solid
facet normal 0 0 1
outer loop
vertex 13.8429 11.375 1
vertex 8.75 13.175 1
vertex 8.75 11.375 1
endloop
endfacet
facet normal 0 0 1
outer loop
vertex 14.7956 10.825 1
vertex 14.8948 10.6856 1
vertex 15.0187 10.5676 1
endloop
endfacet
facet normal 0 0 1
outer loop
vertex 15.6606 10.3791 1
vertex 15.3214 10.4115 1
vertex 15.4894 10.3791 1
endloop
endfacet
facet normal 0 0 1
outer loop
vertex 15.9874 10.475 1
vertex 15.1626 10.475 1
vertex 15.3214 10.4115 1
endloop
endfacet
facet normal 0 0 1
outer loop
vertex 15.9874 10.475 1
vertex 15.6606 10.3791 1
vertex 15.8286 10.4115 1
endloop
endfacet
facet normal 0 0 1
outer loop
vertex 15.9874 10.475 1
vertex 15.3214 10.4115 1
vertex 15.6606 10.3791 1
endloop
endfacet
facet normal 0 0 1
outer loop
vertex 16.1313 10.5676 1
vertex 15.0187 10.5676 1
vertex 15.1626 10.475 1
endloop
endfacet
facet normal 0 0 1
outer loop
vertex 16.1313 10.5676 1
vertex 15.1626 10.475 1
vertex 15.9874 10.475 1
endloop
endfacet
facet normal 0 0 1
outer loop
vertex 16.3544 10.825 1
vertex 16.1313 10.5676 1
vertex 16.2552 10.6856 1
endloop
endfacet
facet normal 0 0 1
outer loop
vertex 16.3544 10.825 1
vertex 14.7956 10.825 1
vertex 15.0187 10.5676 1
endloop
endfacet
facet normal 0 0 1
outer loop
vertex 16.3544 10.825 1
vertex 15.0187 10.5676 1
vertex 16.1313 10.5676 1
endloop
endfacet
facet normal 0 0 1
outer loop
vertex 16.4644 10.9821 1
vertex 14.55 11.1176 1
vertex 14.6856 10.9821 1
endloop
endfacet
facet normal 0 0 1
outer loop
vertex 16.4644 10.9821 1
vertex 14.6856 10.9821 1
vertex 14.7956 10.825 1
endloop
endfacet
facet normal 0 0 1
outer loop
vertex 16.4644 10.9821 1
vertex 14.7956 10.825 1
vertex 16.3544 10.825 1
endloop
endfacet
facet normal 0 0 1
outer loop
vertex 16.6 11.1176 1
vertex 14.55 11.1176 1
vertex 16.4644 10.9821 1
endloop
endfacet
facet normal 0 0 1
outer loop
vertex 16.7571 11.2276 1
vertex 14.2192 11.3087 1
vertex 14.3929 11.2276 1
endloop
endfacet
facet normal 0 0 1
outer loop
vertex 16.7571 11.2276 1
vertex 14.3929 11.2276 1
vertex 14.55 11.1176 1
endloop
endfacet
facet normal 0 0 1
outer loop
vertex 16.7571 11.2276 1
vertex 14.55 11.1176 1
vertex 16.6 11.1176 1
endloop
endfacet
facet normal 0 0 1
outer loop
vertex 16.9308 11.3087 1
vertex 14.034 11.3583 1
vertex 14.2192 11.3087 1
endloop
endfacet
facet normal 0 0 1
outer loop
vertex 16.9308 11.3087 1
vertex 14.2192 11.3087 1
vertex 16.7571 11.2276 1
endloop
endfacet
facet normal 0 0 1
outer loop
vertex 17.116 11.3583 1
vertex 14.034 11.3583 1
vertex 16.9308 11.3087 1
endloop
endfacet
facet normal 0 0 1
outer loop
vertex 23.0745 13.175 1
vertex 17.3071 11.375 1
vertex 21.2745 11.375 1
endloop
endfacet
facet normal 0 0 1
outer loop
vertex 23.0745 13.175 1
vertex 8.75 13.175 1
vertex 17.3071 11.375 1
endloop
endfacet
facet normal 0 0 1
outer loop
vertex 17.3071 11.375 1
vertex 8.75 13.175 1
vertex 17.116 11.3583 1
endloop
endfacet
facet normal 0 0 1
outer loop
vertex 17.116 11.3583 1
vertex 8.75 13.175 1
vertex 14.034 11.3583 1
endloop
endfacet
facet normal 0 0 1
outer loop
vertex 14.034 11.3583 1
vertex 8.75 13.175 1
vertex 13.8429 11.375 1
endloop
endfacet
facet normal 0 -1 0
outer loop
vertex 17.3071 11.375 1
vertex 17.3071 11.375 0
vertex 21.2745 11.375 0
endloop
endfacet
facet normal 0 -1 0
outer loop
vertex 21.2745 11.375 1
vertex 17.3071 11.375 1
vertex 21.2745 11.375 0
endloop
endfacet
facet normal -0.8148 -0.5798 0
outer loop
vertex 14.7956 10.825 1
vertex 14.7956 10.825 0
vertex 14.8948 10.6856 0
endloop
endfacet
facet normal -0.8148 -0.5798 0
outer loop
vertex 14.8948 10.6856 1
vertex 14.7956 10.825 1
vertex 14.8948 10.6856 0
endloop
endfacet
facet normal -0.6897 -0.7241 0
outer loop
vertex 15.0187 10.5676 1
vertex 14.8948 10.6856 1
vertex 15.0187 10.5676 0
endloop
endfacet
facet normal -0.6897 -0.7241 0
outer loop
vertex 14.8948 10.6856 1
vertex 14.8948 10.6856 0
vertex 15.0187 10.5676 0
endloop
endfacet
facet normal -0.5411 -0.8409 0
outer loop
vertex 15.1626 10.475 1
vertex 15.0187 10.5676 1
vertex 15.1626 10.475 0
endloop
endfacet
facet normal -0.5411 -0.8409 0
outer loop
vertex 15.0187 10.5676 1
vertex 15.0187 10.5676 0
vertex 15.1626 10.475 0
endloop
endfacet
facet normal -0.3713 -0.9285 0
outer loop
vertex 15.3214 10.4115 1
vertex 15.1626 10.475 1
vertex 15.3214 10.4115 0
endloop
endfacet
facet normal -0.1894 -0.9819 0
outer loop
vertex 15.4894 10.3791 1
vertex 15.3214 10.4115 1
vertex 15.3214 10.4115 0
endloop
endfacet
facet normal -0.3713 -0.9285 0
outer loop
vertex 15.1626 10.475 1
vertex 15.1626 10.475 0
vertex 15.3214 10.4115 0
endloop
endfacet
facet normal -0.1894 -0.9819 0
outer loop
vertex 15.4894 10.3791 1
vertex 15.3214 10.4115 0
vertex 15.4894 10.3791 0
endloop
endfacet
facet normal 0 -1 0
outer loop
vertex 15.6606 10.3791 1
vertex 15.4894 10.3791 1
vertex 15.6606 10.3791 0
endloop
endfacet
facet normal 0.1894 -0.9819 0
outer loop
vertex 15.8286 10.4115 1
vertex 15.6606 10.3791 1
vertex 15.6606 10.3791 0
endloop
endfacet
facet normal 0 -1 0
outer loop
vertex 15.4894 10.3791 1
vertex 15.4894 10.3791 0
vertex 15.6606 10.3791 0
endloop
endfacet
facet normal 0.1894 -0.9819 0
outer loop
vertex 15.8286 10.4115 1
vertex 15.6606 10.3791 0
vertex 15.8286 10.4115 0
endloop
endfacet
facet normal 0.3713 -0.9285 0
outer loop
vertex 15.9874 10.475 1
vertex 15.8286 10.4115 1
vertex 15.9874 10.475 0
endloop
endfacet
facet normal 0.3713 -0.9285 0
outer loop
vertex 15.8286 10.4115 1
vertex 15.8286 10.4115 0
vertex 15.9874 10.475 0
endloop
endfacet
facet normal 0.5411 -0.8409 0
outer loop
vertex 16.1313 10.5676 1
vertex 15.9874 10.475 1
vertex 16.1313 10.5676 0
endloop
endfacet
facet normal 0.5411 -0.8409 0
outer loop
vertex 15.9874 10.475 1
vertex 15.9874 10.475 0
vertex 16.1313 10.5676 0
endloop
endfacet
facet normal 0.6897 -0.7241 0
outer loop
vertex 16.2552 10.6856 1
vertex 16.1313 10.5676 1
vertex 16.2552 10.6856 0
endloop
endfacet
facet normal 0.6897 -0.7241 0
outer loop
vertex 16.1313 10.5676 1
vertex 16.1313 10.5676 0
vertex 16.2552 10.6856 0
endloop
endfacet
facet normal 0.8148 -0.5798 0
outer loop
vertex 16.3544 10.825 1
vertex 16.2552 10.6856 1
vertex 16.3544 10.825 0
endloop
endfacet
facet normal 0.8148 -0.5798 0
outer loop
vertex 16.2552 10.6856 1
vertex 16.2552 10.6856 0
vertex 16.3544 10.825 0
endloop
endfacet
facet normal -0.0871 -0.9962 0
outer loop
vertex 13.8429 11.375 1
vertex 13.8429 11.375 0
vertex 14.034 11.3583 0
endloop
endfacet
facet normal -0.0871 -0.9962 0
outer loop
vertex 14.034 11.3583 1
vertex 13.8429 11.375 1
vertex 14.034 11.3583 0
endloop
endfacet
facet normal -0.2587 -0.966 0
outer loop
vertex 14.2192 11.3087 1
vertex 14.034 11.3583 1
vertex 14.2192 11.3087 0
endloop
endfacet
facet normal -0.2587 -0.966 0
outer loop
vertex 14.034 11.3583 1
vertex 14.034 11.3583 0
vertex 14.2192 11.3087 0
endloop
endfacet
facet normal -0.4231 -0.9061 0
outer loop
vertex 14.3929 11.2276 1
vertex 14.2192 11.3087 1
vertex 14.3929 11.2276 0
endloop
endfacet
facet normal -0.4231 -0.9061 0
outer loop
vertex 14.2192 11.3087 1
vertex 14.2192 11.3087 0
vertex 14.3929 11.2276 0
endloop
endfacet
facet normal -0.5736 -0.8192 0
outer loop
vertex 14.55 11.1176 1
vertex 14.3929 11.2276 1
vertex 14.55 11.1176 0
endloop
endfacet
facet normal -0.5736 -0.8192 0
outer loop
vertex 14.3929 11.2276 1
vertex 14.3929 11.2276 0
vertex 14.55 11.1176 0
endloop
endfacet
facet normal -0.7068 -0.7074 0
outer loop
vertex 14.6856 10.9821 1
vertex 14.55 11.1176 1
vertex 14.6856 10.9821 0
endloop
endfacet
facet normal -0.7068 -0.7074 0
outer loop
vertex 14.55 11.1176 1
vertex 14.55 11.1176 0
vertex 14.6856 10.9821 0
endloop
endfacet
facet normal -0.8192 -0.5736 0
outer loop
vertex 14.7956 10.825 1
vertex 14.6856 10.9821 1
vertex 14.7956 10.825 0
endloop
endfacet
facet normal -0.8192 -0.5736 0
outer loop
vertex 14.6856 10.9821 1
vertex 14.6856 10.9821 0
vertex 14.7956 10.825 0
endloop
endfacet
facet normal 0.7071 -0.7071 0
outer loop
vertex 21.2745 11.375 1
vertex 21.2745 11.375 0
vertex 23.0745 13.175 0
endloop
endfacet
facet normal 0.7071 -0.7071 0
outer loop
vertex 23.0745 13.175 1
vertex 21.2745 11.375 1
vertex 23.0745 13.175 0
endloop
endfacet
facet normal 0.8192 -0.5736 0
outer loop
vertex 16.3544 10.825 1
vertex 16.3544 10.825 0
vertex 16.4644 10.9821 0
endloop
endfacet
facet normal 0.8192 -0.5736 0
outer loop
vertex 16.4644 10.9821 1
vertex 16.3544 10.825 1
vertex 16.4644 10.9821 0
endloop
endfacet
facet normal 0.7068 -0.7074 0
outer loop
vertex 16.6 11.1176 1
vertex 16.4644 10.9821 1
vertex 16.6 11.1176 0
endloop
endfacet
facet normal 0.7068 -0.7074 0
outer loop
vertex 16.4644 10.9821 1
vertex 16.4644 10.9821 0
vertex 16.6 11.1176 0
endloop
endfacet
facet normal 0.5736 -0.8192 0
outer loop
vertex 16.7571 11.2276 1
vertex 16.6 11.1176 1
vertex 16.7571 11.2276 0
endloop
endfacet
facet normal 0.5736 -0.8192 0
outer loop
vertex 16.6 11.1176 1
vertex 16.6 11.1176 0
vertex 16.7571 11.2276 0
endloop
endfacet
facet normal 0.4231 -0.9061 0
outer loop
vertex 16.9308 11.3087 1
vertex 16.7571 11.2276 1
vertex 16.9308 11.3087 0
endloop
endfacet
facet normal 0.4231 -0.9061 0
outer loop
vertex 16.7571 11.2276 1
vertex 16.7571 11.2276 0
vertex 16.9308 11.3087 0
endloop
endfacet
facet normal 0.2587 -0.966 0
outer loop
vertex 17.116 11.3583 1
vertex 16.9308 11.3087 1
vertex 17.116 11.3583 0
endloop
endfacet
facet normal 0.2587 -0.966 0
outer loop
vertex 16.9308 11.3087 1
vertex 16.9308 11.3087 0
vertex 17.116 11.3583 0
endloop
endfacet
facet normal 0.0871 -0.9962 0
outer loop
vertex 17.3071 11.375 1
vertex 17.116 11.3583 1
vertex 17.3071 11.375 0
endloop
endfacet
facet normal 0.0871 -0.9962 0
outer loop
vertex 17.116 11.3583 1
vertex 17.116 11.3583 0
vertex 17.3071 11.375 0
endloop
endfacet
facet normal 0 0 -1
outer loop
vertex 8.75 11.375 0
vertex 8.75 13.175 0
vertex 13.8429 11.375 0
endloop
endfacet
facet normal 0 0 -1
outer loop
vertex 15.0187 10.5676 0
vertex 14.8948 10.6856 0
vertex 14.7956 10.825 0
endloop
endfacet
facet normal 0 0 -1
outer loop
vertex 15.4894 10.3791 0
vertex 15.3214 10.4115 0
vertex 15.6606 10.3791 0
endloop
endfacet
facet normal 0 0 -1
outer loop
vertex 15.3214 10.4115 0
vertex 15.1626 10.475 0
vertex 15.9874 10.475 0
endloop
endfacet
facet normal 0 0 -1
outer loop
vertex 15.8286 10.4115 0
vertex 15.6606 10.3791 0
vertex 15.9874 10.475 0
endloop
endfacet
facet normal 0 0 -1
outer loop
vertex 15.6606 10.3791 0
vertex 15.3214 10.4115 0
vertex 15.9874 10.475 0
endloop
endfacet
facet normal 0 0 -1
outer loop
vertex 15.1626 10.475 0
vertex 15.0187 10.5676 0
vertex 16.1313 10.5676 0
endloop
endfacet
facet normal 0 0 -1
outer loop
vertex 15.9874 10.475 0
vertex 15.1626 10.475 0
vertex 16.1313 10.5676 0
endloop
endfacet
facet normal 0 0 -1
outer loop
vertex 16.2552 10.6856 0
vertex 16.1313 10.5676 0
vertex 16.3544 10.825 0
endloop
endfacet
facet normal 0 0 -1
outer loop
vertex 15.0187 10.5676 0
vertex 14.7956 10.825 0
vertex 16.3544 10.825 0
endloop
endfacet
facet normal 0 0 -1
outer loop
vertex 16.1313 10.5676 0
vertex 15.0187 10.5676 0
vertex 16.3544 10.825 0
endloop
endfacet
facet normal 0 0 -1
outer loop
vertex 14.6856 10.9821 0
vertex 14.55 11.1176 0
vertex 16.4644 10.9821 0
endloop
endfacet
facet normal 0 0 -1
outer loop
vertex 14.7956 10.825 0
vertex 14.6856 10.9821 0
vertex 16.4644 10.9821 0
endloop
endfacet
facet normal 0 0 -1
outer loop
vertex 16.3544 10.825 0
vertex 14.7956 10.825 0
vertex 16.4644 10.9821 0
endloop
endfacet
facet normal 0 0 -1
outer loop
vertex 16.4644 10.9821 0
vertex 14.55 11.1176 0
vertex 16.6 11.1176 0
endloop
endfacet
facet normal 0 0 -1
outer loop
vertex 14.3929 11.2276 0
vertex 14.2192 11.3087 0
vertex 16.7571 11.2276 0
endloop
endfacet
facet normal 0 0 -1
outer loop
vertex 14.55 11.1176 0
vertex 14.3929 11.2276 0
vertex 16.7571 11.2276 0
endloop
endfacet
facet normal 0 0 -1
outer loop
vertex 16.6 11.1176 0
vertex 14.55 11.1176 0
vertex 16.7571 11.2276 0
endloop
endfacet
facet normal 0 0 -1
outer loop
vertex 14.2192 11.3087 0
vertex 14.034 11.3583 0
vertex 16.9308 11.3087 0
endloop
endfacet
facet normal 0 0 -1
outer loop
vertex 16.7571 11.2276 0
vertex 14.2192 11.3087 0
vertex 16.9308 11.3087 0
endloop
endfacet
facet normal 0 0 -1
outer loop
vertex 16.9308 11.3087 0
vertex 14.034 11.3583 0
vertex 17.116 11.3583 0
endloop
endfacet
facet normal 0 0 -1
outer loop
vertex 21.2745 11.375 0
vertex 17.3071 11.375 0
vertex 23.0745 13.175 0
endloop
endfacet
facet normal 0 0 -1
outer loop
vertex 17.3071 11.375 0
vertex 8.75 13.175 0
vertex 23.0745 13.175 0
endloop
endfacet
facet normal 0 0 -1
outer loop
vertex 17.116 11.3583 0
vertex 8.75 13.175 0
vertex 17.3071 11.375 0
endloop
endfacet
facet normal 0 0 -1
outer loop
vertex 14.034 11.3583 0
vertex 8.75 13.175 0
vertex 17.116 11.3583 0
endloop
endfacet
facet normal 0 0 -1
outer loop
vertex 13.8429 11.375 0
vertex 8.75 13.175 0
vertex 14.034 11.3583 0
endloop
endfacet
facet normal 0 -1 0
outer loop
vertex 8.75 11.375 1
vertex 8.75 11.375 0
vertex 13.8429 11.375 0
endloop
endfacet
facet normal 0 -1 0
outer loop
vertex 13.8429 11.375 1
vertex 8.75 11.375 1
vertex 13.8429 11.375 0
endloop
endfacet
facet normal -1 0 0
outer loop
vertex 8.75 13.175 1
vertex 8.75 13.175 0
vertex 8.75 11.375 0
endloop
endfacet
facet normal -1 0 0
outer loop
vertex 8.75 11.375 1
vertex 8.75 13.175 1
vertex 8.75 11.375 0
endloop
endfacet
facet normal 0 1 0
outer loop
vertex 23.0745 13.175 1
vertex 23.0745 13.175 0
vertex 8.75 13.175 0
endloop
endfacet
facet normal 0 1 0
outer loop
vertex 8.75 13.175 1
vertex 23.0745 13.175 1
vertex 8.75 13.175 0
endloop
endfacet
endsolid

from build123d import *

# Parameters (mm, degrees)
SHAPE_DEPTH = 1


with BuildPart() as part:
    # Sketch1 → Shape (new body)
    with BuildSketch(Plane.XY):
        with BuildLine():
            Line((17.307050808, 11.375), (21.274494937, 11.375))
            Line((21.274494937, 11.375), (23.074494937, 13.175))
            Line((23.074494937, 13.175), (8.75, 13.175))
            Line((8.75, 13.175), (8.75, 11.375))
            Line((8.75, 11.375), (13.842949192, 11.375))
            ThreePointArc((13.842949192, 11.375), (14.392949192, 11.227627944), (14.795577137, 10.825))
            ThreePointArc((14.795577137, 10.825), (15.575, 10.375), (16.354422863, 10.825))
            ThreePointArc((16.354422863, 10.825), (16.757050808, 11.227627944), (17.307050808, 11.375))
        make_face()
    extrude(amount=SHAPE_DEPTH)


solid = part.part
